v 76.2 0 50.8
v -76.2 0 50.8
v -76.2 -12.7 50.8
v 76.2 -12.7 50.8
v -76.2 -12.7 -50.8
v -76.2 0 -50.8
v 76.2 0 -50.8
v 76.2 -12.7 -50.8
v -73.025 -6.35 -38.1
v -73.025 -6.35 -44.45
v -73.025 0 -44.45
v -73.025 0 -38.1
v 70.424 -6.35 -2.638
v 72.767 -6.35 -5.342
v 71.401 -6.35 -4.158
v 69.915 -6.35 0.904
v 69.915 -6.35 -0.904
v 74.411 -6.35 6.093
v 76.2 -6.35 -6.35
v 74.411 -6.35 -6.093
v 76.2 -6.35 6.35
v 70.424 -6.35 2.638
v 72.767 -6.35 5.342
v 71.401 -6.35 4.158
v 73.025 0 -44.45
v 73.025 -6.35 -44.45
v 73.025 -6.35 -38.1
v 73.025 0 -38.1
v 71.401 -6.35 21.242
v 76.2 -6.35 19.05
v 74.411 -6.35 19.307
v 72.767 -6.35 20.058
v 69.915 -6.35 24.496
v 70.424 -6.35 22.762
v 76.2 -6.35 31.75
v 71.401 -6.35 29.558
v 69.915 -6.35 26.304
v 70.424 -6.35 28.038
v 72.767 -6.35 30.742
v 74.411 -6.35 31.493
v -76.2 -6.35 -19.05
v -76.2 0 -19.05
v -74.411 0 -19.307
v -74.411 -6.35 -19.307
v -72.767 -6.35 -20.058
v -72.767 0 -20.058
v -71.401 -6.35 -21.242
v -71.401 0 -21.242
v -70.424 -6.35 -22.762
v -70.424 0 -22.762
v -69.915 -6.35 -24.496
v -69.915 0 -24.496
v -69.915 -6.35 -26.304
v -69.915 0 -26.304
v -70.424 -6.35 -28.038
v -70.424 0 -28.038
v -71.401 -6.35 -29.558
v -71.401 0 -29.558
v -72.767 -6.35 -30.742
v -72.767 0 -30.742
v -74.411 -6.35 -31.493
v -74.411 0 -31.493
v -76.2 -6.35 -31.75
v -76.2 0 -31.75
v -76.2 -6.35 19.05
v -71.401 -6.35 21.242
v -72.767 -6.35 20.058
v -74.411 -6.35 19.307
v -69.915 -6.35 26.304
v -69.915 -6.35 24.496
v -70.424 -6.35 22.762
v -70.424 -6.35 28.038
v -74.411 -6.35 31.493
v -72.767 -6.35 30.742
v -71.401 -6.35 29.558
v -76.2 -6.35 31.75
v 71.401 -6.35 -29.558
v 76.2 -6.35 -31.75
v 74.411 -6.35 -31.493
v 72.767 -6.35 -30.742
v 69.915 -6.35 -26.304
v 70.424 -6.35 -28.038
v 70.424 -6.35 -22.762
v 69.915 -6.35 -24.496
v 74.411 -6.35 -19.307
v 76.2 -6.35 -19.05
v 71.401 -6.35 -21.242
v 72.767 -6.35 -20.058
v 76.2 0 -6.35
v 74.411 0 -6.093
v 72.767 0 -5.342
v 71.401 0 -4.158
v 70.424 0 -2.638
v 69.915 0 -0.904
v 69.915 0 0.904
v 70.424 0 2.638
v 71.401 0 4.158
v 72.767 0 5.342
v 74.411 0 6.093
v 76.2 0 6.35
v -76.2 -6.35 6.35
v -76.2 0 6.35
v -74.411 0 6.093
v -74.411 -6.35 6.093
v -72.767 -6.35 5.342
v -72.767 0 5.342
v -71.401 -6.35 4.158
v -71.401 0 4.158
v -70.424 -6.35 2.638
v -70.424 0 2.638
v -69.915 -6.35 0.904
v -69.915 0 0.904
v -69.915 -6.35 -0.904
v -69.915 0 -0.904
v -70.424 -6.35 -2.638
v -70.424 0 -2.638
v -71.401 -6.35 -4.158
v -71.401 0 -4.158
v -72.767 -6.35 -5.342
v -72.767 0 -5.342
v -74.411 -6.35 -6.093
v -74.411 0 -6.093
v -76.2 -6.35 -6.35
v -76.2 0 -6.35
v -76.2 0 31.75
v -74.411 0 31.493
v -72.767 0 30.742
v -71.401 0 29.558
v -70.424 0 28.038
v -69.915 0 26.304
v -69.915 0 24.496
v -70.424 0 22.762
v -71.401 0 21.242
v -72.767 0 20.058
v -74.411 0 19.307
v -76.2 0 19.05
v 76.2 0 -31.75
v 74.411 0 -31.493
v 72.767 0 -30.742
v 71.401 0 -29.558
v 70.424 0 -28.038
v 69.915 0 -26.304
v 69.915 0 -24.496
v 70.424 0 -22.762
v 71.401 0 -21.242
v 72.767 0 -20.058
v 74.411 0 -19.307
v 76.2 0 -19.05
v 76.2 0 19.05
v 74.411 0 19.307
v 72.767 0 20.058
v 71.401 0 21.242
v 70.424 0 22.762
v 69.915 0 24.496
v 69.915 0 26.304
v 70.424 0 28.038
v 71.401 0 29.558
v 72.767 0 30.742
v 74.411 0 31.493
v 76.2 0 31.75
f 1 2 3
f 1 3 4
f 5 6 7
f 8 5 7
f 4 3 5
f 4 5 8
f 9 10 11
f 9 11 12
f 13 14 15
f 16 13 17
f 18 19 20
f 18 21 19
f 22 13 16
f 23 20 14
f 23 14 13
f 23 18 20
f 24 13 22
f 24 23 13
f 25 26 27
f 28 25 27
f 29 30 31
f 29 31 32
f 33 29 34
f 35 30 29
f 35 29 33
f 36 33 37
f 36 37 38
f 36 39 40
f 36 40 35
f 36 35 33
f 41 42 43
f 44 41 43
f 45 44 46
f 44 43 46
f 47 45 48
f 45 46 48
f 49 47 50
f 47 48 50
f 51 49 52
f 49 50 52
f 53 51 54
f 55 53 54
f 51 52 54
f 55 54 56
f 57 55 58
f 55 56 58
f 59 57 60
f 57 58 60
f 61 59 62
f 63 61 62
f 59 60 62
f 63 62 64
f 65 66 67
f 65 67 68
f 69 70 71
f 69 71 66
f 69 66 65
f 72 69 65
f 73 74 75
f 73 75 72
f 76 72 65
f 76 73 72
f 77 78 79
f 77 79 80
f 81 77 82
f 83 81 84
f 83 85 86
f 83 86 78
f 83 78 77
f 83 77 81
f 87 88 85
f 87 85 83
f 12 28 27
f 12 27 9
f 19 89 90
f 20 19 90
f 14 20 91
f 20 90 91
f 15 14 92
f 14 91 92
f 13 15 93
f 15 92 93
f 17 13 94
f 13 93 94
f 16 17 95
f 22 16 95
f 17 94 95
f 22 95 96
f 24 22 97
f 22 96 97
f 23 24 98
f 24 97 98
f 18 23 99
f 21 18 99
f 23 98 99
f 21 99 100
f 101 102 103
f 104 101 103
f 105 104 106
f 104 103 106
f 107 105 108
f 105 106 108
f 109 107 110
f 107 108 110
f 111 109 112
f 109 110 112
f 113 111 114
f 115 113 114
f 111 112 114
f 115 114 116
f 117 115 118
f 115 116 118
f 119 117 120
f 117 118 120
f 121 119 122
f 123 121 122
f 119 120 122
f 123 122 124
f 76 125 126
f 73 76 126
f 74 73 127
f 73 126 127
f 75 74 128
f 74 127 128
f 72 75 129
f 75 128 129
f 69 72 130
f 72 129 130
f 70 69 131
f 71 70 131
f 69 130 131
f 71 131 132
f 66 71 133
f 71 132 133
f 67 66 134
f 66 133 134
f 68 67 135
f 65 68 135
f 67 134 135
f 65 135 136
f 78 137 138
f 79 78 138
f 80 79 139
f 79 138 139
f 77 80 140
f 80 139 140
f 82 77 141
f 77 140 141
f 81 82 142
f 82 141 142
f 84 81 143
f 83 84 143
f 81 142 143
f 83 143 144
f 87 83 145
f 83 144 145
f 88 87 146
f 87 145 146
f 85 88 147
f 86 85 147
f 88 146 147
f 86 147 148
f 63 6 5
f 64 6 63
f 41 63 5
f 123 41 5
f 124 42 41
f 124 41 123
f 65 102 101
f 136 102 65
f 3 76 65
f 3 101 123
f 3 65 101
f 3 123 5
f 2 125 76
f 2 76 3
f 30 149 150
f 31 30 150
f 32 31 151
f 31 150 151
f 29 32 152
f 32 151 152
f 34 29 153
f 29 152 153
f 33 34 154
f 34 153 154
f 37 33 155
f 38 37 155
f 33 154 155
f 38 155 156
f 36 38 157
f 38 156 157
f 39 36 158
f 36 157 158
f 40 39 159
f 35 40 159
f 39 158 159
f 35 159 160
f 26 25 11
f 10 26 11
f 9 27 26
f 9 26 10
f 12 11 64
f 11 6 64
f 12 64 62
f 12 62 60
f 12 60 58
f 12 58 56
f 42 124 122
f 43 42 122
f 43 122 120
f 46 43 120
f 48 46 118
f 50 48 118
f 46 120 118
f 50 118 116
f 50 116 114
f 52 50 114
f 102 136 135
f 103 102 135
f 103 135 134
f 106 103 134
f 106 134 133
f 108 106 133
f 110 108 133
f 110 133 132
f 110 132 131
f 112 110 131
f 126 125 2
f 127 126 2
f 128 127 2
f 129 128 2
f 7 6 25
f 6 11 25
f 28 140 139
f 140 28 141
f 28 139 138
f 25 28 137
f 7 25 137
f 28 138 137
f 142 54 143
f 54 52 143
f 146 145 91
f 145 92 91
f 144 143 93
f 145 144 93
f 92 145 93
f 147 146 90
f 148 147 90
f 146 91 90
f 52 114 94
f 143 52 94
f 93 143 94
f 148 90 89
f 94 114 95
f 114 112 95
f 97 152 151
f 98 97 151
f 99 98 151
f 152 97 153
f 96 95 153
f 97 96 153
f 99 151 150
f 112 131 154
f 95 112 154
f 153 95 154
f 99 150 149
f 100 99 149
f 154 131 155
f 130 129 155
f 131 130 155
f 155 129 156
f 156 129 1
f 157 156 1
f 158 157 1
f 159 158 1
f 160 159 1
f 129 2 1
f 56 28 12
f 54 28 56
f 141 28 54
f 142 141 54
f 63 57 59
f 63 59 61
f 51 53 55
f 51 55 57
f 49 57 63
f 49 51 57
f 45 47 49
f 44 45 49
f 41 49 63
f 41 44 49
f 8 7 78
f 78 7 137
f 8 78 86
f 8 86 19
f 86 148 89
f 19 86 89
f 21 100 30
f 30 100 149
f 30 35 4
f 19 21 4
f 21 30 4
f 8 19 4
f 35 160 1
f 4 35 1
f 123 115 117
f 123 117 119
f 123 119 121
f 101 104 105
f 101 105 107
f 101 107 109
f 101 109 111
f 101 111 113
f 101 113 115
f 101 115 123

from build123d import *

# Parameters (mm, degrees)
F0_W     = 152.4
F0_H     = 101.6
F1_DEPTH = 12.7
F2_W     = 146.05
F2_H     = 6.35
F3_DEPTH = 6.35
F5_DEPTH = 6.35


with BuildPart() as f1:
    # F0 (on Front) → F1 (new body)
    with BuildSketch(Plane.XZ):
        Rectangle(F0_W, F0_H)
    extrude(amount=F1_DEPTH)

    # F2 (on face) → F3 (cut)
    with BuildSketch(Plane(origin=(0, 0, 0), x_dir=(-1, 0, 0), z_dir=(0, 1, 0))):
        with Locations((0, -41.275)):
            Rectangle(F2_W, F2_H)
    extrude(amount=-F3_DEPTH, mode=Mode.SUBTRACT)

    # F4 (on face) → F5 (cut)
    with BuildSketch(Plane(origin=(0, 0, 0), x_dir=(-1, 0, 0), z_dir=(0, 1, 0))):
        with BuildLine():
            Line((76.2, 19.05), (76.2, 31.75))
            ThreePointArc((76.2, 31.75), (69.85, 25.4), (76.2, 19.05))
        make_face()
        with BuildLine():
            Line((76.2, -6.35), (76.2, 6.35))
            ThreePointArc((76.2, 6.35), (69.85, 0), (76.2, -6.35))
        make_face()
        with BuildLine():
            ThreePointArc((76.2, -19.05), (69.85, -25.4), (76.2, -31.75))
            Line((76.2, -31.75), (76.2, -19.05))
        make_face()
        with BuildLine():
            ThreePointArc((-76.2, -31.75), (-69.85, -25.4), (-76.2, -19.05))
            Line((-76.2, -19.05), (-76.2, -31.75))
        make_face()
        with BuildLine():
            ThreePointArc((-76.2, -6.35), (-69.85, 0), (-76.2, 6.35))
            Line((-76.2, 6.35), (-76.2, -6.35))
        make_face()
        with BuildLine():
            Line((-76.2, 31.75), (-76.2, 19.05))
            ThreePointArc((-76.2, 19.05), (-69.85, 25.4), (-76.2, 31.75))
        make_face()
    extrude(amount=-F5_DEPTH, mode=Mode.SUBTRACT)


solid = f1.part
